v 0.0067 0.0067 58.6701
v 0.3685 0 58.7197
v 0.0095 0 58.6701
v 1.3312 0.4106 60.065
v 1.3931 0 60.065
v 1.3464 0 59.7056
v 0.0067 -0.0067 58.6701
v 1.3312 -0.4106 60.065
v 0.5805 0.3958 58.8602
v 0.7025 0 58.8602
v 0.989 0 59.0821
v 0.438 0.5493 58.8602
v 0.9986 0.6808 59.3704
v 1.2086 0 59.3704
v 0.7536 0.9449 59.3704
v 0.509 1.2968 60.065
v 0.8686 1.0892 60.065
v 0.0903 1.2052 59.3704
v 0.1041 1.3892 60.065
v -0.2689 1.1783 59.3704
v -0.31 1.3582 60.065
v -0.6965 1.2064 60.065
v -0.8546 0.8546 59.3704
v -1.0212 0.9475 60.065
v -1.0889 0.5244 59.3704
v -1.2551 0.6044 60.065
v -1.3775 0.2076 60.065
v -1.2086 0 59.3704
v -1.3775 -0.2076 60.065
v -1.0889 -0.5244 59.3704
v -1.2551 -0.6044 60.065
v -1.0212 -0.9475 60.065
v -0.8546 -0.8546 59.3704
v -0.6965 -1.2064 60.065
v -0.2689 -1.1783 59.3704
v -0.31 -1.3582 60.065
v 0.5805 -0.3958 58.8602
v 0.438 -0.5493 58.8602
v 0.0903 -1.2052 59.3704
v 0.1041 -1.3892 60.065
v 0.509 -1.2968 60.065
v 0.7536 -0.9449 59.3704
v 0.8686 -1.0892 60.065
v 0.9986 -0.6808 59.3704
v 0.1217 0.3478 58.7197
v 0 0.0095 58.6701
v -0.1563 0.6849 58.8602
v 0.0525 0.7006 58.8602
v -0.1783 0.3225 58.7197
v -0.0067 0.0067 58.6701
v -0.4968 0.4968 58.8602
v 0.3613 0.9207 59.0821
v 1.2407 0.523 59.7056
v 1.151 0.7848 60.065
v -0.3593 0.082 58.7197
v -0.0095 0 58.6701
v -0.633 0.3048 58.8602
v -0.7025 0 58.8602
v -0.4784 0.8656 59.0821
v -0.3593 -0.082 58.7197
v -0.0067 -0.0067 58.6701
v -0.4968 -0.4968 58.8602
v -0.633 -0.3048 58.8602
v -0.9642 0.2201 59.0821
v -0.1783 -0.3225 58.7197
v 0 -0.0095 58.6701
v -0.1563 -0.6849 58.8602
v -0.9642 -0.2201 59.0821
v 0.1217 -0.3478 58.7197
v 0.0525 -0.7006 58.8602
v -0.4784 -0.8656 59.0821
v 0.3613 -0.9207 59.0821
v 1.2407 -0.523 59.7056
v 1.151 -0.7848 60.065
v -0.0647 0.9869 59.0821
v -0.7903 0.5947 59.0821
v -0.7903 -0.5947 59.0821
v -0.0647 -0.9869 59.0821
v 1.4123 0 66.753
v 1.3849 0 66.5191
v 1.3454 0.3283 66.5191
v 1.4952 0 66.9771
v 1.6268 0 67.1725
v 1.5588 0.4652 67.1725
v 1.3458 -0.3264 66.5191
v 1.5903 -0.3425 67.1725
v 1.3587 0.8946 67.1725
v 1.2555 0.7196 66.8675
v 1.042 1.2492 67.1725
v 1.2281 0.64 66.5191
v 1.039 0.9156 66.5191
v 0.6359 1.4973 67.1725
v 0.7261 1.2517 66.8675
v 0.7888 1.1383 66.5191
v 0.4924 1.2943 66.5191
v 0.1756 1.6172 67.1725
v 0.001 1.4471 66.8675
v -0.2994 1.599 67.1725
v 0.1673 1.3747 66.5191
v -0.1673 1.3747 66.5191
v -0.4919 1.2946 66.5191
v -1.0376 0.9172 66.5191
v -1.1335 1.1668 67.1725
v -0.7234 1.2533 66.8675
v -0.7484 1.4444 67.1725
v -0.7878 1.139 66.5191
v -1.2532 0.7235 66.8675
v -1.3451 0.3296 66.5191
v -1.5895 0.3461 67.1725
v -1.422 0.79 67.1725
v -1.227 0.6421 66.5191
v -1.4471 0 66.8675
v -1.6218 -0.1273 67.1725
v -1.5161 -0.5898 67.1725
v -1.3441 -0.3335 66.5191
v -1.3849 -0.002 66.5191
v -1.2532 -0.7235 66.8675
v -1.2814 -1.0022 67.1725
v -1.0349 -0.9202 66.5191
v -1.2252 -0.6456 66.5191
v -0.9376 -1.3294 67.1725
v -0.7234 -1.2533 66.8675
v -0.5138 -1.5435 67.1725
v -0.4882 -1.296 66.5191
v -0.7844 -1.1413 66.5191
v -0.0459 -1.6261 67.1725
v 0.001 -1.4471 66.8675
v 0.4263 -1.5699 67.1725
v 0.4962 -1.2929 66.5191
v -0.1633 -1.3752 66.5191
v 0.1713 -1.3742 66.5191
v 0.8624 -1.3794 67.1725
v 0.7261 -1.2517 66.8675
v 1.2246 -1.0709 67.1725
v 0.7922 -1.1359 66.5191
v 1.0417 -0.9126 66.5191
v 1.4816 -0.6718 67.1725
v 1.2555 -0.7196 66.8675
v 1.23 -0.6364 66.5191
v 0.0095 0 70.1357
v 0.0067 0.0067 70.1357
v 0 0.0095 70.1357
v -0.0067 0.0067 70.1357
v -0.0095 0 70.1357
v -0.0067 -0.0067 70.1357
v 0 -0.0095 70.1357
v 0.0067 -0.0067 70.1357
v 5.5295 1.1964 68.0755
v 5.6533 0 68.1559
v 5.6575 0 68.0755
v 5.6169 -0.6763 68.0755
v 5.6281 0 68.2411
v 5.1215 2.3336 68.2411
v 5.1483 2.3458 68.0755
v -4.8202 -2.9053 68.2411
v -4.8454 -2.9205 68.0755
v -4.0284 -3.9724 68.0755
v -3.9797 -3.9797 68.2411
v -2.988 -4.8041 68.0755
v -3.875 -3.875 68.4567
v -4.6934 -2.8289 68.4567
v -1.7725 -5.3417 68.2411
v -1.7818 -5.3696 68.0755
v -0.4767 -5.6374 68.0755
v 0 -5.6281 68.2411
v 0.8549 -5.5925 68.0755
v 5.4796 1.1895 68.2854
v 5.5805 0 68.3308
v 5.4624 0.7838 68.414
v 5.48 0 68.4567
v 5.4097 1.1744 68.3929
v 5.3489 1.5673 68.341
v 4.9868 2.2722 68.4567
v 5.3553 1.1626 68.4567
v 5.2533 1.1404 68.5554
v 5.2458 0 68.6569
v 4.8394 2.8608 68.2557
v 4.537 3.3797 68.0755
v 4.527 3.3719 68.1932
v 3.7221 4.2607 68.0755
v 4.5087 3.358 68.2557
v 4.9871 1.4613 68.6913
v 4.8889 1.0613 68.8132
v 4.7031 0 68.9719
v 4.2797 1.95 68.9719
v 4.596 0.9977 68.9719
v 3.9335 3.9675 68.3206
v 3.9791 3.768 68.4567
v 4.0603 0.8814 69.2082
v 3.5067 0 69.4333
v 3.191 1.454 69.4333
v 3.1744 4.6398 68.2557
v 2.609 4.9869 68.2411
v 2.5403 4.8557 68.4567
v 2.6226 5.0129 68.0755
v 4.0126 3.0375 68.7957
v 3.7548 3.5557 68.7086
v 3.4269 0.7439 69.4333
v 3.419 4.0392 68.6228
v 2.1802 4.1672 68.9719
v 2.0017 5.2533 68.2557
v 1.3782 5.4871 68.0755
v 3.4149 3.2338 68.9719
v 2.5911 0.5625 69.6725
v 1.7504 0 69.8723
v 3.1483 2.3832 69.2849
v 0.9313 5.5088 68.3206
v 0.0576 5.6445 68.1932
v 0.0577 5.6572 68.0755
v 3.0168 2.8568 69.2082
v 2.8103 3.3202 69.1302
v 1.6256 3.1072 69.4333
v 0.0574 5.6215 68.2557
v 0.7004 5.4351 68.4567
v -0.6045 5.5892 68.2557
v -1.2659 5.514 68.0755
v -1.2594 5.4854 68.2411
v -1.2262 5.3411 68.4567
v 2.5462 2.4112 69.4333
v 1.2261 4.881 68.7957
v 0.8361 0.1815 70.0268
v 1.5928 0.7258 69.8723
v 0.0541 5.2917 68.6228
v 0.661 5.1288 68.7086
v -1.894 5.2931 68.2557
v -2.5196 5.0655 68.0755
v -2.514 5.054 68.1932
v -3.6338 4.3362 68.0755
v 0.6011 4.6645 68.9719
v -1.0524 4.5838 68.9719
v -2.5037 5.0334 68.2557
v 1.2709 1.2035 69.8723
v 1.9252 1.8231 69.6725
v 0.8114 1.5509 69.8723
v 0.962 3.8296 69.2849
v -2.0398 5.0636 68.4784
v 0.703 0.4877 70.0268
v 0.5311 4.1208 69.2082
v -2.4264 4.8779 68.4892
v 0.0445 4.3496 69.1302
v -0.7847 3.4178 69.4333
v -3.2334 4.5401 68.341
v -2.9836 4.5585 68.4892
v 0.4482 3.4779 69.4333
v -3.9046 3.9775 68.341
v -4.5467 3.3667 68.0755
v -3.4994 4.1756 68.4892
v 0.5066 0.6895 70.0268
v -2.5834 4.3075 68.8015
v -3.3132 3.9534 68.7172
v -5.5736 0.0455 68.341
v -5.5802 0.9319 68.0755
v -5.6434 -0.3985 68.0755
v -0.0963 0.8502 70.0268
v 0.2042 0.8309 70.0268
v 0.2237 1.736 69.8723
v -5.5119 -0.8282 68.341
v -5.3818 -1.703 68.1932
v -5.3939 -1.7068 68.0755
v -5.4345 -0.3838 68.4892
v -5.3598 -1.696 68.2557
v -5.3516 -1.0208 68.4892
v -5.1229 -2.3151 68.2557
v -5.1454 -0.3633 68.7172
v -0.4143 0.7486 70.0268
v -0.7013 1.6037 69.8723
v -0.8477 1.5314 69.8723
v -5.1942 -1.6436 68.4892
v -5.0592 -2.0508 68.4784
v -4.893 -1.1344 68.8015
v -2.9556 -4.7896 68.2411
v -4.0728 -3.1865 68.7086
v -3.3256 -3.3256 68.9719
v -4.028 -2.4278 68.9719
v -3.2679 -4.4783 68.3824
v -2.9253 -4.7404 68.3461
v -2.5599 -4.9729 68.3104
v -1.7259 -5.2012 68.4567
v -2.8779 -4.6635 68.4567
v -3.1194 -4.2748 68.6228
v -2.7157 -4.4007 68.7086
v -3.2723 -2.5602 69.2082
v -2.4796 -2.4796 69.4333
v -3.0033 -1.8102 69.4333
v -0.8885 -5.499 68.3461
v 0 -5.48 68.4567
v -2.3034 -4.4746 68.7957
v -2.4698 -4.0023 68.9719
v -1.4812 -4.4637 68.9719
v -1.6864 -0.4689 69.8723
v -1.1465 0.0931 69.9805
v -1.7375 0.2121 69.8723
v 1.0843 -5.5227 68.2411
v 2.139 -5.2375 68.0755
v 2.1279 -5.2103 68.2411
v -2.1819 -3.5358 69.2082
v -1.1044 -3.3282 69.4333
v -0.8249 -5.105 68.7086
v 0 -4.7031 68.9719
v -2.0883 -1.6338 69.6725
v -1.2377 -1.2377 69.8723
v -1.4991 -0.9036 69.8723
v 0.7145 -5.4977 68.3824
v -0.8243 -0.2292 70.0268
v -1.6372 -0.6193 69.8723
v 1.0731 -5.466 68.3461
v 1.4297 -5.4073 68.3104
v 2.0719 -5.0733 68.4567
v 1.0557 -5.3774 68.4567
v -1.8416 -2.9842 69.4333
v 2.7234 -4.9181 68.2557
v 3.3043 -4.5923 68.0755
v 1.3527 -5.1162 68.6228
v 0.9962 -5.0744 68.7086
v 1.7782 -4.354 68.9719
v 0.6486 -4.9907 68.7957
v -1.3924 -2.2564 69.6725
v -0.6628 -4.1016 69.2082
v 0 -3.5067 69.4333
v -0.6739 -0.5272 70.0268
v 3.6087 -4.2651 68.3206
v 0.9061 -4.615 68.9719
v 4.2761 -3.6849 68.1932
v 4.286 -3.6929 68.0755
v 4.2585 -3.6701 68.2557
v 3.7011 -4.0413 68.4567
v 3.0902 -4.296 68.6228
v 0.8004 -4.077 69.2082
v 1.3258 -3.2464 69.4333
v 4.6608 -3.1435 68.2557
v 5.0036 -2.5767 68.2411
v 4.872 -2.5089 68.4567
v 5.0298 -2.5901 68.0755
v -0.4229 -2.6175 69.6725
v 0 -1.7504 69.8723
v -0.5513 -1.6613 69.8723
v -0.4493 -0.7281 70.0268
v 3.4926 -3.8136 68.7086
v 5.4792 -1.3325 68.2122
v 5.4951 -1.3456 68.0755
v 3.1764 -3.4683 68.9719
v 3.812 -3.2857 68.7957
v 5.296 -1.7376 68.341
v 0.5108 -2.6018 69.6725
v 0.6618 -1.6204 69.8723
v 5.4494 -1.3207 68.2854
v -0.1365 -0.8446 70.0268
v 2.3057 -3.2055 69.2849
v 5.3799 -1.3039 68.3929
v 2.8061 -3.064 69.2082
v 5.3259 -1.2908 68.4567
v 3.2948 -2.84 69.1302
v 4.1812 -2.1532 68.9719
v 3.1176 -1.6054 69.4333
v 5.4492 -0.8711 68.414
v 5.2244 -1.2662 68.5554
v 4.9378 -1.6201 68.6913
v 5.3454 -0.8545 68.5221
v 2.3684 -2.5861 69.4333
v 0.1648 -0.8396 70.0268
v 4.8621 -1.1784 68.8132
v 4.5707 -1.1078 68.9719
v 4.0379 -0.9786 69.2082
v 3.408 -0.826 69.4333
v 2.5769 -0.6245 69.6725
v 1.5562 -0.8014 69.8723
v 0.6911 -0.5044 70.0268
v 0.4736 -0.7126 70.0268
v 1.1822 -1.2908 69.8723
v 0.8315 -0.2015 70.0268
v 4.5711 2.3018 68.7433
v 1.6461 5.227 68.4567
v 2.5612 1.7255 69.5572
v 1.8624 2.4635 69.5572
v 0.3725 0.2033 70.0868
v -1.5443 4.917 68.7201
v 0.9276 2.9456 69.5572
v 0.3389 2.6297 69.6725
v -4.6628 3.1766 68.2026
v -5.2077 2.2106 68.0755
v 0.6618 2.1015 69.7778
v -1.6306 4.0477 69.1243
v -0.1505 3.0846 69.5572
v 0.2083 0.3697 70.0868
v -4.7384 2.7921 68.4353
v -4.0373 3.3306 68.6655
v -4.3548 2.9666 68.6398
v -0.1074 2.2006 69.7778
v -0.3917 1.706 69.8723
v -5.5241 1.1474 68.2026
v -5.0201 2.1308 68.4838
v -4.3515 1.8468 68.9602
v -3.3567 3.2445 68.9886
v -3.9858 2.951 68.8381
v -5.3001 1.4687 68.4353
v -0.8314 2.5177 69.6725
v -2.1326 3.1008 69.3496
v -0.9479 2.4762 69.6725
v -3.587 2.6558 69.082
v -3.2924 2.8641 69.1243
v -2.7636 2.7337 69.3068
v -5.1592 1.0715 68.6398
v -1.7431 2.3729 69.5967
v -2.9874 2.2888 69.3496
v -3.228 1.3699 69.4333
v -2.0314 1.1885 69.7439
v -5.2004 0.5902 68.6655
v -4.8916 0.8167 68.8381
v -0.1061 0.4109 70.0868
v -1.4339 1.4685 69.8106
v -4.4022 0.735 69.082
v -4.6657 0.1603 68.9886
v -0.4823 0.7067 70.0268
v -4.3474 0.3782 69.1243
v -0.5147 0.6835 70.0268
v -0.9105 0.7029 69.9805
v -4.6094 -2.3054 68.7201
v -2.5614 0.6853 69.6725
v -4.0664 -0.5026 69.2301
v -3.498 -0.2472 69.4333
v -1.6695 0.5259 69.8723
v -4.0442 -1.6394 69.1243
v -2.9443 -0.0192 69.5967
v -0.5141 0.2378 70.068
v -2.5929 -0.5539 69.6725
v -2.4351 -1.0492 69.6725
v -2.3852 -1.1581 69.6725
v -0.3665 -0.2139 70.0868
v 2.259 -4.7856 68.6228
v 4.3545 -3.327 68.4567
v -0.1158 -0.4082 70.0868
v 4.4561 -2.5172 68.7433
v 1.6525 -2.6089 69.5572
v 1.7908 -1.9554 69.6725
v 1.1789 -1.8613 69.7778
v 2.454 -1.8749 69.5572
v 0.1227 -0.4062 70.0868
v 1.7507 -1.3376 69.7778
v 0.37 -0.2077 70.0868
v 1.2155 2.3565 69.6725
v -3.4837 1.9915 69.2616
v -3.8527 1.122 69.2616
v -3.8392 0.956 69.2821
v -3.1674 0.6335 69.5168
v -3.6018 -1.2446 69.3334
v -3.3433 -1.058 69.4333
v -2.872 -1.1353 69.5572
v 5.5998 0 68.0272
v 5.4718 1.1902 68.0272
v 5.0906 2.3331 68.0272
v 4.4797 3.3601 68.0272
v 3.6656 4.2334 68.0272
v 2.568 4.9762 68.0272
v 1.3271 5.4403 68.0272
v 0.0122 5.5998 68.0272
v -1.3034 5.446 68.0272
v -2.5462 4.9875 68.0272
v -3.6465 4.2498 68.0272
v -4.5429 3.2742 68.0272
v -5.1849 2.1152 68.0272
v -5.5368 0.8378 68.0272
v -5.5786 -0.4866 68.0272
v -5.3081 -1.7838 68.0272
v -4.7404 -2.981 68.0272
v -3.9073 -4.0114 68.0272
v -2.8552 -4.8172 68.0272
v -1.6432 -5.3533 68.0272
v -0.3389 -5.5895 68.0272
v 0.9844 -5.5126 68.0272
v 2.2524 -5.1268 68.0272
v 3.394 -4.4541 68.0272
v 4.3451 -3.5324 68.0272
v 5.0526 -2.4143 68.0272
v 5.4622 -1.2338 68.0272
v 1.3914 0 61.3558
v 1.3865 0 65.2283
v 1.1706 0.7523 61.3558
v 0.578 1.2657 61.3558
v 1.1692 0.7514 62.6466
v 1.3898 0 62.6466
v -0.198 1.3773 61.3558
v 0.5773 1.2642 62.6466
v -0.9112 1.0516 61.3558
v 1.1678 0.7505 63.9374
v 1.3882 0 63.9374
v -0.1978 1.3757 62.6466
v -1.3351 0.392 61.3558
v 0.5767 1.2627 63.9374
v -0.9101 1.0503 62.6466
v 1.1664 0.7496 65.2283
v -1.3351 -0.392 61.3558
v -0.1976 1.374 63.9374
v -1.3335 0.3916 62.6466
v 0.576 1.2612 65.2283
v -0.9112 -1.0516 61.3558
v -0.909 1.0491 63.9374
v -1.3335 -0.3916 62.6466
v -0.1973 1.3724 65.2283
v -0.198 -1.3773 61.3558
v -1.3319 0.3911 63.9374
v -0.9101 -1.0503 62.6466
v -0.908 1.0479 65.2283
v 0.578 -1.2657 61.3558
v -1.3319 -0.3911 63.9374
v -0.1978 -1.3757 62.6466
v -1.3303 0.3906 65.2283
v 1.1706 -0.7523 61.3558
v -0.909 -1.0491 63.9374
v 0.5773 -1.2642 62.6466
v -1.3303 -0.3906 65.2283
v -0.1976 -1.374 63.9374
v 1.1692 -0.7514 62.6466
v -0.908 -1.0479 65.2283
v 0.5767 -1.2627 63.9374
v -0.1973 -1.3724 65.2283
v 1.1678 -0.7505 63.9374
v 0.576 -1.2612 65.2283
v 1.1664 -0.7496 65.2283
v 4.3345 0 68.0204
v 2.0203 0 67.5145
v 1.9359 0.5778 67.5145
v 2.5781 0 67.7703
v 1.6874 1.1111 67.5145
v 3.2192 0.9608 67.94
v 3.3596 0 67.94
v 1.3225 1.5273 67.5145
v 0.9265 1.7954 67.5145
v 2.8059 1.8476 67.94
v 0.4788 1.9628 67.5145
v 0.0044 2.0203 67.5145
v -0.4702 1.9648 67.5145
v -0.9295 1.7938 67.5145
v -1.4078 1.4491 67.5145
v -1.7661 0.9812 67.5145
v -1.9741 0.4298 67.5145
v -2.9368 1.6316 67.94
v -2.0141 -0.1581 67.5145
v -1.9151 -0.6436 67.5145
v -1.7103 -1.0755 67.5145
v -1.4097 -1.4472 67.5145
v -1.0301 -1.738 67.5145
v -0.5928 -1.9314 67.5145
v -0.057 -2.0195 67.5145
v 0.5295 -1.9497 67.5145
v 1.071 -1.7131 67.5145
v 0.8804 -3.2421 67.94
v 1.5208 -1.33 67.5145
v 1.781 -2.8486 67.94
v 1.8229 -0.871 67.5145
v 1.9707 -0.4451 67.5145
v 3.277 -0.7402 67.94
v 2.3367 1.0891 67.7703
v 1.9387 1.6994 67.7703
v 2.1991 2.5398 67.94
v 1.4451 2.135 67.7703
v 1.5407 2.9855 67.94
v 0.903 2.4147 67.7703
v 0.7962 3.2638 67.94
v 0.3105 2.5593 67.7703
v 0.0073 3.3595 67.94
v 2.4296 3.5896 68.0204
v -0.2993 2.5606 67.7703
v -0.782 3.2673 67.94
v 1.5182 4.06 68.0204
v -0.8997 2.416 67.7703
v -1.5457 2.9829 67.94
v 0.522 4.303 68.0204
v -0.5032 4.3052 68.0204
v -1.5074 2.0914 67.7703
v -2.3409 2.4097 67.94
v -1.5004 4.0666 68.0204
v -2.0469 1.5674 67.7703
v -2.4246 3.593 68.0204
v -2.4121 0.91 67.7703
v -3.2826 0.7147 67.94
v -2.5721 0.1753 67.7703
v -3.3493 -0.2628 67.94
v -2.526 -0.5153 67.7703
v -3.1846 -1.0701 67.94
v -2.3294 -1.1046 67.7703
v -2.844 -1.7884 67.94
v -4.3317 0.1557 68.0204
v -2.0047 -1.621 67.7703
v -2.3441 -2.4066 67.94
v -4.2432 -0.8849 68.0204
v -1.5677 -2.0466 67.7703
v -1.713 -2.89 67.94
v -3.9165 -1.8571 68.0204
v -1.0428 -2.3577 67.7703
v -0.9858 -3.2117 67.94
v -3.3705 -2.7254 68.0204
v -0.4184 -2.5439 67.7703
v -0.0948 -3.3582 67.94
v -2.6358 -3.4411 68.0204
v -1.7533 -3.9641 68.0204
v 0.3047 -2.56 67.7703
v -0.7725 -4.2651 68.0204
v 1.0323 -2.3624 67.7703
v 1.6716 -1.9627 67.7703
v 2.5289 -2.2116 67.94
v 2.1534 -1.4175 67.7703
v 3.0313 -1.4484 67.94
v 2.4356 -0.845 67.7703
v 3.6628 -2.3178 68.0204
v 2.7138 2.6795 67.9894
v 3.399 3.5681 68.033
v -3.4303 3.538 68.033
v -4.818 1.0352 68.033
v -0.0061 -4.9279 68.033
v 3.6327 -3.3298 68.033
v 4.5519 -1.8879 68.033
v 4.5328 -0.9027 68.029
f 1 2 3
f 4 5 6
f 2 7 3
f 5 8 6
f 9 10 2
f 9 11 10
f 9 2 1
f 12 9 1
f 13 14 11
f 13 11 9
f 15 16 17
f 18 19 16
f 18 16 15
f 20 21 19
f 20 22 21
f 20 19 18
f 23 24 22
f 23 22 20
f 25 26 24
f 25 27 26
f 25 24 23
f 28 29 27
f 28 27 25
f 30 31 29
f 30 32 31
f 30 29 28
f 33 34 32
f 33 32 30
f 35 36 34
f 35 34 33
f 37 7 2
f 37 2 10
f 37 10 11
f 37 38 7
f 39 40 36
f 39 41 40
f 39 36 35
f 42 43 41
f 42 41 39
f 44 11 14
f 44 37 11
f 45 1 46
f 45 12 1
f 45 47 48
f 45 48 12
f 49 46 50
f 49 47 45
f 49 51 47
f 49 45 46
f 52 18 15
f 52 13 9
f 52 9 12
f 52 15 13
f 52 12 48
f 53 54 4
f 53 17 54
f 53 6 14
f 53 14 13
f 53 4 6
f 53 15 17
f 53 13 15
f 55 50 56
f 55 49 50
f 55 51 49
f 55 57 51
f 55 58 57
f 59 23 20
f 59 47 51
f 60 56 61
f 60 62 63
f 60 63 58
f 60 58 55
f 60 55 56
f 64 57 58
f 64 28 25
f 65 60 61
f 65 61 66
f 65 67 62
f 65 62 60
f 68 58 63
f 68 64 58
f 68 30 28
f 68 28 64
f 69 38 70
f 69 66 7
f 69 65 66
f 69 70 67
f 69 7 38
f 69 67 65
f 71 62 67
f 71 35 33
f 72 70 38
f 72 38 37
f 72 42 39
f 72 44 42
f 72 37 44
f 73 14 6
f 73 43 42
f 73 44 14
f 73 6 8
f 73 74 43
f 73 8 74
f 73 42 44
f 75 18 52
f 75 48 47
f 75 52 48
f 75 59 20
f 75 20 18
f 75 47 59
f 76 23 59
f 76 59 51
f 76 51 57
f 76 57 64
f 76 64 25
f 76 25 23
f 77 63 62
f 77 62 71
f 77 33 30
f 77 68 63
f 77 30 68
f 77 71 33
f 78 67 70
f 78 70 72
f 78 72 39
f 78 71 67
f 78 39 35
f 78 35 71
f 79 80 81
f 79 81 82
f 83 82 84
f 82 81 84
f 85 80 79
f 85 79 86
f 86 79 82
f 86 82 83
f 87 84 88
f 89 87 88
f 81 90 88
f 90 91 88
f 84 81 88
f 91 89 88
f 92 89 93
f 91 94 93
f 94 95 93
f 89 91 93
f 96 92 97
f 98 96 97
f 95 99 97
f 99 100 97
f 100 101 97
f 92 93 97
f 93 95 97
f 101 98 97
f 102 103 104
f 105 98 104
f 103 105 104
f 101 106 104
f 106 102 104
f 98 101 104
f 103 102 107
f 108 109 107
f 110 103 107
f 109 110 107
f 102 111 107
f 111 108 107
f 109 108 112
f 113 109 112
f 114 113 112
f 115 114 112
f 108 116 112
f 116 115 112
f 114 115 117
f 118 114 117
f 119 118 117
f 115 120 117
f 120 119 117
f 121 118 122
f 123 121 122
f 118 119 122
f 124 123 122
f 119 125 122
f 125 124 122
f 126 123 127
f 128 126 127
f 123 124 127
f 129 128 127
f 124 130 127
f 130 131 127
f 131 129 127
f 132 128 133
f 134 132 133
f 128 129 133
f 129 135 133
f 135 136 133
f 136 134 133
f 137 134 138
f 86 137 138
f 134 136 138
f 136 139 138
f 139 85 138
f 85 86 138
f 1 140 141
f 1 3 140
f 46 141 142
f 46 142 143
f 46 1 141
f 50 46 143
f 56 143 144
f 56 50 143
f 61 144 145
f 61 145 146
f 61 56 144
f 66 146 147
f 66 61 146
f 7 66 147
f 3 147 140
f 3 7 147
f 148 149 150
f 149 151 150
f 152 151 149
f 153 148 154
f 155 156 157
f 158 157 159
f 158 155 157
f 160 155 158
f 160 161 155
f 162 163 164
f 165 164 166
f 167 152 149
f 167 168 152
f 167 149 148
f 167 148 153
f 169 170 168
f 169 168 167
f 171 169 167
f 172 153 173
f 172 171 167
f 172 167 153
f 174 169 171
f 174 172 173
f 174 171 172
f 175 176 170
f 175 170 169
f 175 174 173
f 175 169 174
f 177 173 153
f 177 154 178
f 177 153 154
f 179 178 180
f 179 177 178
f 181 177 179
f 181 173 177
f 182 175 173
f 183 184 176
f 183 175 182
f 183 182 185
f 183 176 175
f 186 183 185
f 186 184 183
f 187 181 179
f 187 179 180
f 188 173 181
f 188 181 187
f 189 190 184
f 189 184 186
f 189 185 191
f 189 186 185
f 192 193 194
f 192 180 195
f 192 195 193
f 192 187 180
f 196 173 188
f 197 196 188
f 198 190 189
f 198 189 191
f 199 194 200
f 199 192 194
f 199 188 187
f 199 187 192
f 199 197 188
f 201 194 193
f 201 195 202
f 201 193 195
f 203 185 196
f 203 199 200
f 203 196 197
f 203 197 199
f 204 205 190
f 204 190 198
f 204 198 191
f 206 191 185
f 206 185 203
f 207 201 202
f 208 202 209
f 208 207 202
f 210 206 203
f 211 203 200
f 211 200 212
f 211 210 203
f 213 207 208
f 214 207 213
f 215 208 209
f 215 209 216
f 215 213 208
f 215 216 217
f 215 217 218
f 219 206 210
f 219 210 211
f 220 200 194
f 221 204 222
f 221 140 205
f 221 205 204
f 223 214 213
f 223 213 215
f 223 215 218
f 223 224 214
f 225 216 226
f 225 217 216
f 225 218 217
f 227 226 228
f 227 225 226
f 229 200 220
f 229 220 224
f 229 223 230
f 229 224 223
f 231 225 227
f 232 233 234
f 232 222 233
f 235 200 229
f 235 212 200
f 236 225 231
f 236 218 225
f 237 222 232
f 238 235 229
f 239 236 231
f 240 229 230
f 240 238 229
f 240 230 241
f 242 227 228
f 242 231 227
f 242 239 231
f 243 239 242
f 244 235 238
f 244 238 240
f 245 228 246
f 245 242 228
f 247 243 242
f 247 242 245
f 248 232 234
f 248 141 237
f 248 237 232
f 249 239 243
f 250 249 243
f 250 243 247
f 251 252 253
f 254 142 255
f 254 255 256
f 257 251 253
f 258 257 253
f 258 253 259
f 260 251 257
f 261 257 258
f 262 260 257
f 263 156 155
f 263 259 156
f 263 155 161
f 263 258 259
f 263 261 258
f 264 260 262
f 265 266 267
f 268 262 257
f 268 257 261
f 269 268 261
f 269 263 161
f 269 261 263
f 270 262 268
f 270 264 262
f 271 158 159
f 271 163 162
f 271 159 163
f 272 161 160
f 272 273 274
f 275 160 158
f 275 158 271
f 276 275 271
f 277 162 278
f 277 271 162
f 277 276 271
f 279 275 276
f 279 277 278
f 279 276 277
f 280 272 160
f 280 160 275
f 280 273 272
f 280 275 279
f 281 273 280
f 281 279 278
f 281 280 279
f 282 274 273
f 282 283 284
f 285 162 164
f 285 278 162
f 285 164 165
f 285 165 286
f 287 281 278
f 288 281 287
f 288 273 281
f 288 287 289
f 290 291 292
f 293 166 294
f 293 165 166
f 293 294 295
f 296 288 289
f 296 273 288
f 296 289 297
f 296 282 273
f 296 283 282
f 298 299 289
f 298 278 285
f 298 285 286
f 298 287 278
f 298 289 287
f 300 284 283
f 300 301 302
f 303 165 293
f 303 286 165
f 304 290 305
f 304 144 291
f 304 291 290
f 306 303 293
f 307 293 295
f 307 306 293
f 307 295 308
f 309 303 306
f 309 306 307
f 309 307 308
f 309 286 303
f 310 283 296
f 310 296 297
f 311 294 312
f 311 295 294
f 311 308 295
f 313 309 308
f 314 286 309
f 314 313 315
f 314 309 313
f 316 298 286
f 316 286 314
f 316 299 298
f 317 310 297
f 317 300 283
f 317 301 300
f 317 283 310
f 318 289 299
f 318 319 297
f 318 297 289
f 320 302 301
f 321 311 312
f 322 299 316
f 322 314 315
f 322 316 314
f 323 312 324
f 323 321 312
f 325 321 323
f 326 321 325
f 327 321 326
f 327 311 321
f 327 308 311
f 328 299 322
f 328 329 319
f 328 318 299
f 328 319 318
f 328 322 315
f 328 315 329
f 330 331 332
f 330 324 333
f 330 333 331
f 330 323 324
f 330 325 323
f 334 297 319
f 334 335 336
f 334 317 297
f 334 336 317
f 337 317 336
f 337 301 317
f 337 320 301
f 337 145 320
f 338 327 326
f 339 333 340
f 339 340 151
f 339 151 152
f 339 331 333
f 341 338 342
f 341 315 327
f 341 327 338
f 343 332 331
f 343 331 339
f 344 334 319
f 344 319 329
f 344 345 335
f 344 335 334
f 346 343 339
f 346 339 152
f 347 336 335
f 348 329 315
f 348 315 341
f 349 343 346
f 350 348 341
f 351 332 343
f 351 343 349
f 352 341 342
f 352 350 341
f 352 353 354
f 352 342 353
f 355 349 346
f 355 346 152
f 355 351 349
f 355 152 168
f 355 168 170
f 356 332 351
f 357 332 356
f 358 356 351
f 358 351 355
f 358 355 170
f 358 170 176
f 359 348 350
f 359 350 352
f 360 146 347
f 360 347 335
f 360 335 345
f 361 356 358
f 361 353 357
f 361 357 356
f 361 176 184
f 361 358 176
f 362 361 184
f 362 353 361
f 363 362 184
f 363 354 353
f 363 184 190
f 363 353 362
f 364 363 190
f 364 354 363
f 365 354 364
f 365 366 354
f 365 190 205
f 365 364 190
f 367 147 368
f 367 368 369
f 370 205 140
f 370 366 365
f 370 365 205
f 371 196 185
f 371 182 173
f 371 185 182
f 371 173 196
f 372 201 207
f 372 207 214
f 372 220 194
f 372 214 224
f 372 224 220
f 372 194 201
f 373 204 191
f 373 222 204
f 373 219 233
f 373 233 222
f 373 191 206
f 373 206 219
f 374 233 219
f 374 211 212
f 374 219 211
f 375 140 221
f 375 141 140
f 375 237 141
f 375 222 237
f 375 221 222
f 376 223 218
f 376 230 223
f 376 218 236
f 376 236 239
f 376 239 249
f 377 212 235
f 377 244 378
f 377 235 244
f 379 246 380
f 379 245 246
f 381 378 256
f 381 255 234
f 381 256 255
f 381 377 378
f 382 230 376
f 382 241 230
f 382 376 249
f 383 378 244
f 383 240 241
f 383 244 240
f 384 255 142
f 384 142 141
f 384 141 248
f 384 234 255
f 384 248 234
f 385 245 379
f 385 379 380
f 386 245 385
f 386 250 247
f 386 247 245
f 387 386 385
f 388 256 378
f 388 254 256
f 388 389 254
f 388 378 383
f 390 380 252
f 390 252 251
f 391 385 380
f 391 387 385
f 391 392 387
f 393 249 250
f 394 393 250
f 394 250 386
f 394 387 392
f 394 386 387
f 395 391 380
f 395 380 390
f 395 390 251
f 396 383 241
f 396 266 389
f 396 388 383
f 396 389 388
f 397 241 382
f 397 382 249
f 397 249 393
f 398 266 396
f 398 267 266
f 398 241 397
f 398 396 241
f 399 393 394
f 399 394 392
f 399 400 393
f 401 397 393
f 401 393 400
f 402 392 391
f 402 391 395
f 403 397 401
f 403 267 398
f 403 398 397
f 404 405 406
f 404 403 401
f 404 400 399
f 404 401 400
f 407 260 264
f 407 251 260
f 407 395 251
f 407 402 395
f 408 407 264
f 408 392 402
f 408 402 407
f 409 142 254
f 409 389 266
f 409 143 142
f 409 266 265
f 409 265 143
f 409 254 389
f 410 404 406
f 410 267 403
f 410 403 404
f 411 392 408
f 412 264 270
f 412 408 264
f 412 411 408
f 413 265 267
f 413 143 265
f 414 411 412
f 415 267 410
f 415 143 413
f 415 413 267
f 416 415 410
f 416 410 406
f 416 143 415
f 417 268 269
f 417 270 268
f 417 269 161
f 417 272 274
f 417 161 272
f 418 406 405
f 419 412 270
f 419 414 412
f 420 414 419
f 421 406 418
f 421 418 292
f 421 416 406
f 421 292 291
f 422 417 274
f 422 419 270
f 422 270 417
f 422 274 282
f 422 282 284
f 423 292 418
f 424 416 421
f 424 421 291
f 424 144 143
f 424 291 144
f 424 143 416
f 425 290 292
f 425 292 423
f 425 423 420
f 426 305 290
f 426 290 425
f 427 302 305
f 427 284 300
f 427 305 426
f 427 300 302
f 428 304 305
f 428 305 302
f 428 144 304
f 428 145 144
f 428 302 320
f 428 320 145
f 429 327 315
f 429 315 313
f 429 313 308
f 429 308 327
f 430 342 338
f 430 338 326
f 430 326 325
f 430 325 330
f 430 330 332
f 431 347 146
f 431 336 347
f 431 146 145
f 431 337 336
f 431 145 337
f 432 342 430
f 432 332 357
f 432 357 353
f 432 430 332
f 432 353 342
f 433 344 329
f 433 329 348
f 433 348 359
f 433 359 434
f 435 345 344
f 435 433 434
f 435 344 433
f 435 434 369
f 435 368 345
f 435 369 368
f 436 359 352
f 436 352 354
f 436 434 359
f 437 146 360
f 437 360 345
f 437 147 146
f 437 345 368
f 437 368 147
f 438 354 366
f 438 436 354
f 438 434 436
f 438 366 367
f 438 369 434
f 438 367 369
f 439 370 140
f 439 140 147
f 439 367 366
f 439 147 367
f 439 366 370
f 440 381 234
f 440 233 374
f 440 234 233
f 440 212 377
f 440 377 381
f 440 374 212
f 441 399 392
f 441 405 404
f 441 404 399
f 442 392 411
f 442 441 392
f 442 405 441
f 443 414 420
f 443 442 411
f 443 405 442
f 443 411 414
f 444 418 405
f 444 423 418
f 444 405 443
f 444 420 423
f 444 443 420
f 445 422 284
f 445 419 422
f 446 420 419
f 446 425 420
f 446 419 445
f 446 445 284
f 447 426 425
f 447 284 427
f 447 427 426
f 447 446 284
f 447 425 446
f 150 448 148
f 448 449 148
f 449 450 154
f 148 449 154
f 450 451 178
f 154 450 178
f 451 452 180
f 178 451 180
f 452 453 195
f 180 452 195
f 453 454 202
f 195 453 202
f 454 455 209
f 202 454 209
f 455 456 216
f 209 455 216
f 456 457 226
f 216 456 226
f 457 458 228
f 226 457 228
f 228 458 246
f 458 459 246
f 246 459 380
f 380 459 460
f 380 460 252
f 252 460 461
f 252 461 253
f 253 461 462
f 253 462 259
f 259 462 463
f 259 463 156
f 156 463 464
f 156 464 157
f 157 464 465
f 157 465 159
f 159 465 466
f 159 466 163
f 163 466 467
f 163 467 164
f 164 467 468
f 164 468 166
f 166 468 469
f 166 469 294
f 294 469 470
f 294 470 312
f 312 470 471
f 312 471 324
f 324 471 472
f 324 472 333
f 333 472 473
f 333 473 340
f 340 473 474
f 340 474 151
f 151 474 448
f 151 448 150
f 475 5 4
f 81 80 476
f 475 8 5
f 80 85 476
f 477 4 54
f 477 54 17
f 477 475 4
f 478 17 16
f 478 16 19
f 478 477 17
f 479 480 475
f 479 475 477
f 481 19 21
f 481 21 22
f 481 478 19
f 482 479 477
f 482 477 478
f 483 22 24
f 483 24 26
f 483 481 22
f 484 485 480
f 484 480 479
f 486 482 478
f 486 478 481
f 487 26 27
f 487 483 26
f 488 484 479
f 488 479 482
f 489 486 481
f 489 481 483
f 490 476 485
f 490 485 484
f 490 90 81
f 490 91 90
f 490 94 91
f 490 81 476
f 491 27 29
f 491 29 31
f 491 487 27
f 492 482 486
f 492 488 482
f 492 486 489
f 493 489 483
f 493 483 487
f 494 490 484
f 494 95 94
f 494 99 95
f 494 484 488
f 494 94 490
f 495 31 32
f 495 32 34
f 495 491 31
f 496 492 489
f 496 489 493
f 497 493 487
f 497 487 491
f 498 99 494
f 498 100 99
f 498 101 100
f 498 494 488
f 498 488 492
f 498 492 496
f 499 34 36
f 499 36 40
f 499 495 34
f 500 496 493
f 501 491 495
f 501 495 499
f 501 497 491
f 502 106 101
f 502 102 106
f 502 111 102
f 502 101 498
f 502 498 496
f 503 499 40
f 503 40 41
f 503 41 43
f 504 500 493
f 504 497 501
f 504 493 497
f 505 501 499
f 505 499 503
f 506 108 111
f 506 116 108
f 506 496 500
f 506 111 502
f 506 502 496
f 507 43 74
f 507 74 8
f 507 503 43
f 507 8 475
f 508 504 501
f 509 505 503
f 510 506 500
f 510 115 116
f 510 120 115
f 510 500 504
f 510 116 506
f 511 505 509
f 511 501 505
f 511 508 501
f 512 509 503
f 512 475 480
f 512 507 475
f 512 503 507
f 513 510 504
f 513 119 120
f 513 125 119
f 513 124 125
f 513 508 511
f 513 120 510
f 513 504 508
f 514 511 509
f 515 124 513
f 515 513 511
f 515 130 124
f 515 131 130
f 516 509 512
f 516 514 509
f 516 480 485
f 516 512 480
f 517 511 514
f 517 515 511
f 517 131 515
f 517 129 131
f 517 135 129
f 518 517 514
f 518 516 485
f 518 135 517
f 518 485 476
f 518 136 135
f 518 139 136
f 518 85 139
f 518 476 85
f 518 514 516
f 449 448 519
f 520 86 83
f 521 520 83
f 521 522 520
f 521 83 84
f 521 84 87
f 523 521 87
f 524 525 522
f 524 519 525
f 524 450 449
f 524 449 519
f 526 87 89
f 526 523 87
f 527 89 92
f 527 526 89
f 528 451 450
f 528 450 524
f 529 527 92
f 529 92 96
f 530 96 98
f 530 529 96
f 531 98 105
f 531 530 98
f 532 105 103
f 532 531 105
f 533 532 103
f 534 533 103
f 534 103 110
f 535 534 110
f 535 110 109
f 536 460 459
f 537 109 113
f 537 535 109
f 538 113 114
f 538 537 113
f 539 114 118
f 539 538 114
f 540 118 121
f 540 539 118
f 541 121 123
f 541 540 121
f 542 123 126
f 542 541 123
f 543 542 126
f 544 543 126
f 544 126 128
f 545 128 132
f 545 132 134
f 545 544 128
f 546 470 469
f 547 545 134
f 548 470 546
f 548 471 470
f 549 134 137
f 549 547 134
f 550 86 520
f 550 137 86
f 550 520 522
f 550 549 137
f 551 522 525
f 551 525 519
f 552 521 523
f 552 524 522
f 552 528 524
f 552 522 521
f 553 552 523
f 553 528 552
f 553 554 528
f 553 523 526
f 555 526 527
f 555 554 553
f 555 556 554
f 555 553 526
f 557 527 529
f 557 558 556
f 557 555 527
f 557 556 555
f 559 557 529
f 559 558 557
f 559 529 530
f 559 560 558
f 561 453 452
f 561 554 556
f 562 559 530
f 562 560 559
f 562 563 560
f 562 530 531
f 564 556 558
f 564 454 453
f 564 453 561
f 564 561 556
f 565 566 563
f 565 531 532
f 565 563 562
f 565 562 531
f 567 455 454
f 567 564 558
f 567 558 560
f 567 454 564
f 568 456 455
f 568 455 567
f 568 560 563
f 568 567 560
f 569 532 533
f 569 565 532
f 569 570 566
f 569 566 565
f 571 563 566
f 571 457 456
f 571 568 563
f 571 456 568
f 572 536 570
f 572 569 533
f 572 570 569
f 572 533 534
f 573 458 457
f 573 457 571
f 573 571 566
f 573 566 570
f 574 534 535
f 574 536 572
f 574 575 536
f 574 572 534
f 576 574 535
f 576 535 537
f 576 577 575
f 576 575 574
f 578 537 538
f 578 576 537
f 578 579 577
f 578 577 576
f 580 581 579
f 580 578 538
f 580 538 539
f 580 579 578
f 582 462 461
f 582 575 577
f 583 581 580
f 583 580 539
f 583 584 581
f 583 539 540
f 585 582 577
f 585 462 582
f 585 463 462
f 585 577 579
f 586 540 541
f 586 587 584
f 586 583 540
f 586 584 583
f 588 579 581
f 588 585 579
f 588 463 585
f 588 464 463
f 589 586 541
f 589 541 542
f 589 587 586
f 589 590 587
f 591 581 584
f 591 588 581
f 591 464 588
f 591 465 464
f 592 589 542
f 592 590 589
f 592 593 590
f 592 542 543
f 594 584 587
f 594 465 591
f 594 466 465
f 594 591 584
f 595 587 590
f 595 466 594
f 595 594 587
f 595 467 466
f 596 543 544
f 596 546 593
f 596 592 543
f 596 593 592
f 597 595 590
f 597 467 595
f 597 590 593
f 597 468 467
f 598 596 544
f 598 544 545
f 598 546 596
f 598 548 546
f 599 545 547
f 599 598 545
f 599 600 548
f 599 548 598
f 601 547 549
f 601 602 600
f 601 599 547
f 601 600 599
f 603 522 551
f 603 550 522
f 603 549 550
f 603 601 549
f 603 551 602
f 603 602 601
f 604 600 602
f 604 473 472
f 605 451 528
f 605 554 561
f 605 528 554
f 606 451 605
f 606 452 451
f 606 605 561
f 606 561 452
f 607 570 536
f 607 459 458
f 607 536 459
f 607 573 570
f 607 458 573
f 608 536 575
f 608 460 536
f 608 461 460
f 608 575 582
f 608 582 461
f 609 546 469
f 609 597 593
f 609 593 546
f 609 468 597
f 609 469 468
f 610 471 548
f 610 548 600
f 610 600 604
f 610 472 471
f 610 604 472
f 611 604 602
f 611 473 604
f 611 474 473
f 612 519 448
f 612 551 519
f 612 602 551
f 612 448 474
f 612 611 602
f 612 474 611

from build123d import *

# Parameters (mm, degrees)
FILLET010_R     = 1
CHAMFER001_SIZE = 0.05


with BuildPart() as part:
    # Sketch008 → Revolution004 (revolve)
    with BuildSketch(Plane.XZ):
        with BuildLine():
            ThreePointArc((0.009527, 58.670137), (0.989046, 59.082133), (1.393083, 60.064962))
            Line((1.393083, 60.064962), (1.384479, 66.827154))
            add(Edge.make_bspline(
                [(1.384479, 66.827154), (1.889645, 67.694688), (2.696406, 68.092912), (5.649794, 68.026093)],
                knots=[0, 0, 0, 0, 1, 1, 1, 1], degree=3))
            add(Edge.make_bspline(
                [(5.649794, 68.026093), (6.001998, 69.492842), (0.009527, 70.135651)],
                knots=[6.261282, 6.261282, 6.261282, 8.015453, 8.015453, 8.015453], degree=2, weights=[1, 0.639395, 1]))
            Line((0.009527, 70.135651), (0.009527, 58.670137))
        make_face()
    revolve(axis=Axis((0, 0, 0), (0, 0, 1)))

    # Fillet010
    fillet010_edges = [part.edges().sort_by_distance(p)[0] for p in [
        (-1.384479, 0, 66.827154),
    ]]
    fillet(fillet010_edges, radius=FILLET010_R)

    # Chamfer001
    chamfer001_edges = [part.edges().sort_by_distance(p)[0] for p in [
        (-5.649794, 0, 68.026093),
    ]]
    chamfer(chamfer001_edges, length=CHAMFER001_SIZE)


solid = part.part
